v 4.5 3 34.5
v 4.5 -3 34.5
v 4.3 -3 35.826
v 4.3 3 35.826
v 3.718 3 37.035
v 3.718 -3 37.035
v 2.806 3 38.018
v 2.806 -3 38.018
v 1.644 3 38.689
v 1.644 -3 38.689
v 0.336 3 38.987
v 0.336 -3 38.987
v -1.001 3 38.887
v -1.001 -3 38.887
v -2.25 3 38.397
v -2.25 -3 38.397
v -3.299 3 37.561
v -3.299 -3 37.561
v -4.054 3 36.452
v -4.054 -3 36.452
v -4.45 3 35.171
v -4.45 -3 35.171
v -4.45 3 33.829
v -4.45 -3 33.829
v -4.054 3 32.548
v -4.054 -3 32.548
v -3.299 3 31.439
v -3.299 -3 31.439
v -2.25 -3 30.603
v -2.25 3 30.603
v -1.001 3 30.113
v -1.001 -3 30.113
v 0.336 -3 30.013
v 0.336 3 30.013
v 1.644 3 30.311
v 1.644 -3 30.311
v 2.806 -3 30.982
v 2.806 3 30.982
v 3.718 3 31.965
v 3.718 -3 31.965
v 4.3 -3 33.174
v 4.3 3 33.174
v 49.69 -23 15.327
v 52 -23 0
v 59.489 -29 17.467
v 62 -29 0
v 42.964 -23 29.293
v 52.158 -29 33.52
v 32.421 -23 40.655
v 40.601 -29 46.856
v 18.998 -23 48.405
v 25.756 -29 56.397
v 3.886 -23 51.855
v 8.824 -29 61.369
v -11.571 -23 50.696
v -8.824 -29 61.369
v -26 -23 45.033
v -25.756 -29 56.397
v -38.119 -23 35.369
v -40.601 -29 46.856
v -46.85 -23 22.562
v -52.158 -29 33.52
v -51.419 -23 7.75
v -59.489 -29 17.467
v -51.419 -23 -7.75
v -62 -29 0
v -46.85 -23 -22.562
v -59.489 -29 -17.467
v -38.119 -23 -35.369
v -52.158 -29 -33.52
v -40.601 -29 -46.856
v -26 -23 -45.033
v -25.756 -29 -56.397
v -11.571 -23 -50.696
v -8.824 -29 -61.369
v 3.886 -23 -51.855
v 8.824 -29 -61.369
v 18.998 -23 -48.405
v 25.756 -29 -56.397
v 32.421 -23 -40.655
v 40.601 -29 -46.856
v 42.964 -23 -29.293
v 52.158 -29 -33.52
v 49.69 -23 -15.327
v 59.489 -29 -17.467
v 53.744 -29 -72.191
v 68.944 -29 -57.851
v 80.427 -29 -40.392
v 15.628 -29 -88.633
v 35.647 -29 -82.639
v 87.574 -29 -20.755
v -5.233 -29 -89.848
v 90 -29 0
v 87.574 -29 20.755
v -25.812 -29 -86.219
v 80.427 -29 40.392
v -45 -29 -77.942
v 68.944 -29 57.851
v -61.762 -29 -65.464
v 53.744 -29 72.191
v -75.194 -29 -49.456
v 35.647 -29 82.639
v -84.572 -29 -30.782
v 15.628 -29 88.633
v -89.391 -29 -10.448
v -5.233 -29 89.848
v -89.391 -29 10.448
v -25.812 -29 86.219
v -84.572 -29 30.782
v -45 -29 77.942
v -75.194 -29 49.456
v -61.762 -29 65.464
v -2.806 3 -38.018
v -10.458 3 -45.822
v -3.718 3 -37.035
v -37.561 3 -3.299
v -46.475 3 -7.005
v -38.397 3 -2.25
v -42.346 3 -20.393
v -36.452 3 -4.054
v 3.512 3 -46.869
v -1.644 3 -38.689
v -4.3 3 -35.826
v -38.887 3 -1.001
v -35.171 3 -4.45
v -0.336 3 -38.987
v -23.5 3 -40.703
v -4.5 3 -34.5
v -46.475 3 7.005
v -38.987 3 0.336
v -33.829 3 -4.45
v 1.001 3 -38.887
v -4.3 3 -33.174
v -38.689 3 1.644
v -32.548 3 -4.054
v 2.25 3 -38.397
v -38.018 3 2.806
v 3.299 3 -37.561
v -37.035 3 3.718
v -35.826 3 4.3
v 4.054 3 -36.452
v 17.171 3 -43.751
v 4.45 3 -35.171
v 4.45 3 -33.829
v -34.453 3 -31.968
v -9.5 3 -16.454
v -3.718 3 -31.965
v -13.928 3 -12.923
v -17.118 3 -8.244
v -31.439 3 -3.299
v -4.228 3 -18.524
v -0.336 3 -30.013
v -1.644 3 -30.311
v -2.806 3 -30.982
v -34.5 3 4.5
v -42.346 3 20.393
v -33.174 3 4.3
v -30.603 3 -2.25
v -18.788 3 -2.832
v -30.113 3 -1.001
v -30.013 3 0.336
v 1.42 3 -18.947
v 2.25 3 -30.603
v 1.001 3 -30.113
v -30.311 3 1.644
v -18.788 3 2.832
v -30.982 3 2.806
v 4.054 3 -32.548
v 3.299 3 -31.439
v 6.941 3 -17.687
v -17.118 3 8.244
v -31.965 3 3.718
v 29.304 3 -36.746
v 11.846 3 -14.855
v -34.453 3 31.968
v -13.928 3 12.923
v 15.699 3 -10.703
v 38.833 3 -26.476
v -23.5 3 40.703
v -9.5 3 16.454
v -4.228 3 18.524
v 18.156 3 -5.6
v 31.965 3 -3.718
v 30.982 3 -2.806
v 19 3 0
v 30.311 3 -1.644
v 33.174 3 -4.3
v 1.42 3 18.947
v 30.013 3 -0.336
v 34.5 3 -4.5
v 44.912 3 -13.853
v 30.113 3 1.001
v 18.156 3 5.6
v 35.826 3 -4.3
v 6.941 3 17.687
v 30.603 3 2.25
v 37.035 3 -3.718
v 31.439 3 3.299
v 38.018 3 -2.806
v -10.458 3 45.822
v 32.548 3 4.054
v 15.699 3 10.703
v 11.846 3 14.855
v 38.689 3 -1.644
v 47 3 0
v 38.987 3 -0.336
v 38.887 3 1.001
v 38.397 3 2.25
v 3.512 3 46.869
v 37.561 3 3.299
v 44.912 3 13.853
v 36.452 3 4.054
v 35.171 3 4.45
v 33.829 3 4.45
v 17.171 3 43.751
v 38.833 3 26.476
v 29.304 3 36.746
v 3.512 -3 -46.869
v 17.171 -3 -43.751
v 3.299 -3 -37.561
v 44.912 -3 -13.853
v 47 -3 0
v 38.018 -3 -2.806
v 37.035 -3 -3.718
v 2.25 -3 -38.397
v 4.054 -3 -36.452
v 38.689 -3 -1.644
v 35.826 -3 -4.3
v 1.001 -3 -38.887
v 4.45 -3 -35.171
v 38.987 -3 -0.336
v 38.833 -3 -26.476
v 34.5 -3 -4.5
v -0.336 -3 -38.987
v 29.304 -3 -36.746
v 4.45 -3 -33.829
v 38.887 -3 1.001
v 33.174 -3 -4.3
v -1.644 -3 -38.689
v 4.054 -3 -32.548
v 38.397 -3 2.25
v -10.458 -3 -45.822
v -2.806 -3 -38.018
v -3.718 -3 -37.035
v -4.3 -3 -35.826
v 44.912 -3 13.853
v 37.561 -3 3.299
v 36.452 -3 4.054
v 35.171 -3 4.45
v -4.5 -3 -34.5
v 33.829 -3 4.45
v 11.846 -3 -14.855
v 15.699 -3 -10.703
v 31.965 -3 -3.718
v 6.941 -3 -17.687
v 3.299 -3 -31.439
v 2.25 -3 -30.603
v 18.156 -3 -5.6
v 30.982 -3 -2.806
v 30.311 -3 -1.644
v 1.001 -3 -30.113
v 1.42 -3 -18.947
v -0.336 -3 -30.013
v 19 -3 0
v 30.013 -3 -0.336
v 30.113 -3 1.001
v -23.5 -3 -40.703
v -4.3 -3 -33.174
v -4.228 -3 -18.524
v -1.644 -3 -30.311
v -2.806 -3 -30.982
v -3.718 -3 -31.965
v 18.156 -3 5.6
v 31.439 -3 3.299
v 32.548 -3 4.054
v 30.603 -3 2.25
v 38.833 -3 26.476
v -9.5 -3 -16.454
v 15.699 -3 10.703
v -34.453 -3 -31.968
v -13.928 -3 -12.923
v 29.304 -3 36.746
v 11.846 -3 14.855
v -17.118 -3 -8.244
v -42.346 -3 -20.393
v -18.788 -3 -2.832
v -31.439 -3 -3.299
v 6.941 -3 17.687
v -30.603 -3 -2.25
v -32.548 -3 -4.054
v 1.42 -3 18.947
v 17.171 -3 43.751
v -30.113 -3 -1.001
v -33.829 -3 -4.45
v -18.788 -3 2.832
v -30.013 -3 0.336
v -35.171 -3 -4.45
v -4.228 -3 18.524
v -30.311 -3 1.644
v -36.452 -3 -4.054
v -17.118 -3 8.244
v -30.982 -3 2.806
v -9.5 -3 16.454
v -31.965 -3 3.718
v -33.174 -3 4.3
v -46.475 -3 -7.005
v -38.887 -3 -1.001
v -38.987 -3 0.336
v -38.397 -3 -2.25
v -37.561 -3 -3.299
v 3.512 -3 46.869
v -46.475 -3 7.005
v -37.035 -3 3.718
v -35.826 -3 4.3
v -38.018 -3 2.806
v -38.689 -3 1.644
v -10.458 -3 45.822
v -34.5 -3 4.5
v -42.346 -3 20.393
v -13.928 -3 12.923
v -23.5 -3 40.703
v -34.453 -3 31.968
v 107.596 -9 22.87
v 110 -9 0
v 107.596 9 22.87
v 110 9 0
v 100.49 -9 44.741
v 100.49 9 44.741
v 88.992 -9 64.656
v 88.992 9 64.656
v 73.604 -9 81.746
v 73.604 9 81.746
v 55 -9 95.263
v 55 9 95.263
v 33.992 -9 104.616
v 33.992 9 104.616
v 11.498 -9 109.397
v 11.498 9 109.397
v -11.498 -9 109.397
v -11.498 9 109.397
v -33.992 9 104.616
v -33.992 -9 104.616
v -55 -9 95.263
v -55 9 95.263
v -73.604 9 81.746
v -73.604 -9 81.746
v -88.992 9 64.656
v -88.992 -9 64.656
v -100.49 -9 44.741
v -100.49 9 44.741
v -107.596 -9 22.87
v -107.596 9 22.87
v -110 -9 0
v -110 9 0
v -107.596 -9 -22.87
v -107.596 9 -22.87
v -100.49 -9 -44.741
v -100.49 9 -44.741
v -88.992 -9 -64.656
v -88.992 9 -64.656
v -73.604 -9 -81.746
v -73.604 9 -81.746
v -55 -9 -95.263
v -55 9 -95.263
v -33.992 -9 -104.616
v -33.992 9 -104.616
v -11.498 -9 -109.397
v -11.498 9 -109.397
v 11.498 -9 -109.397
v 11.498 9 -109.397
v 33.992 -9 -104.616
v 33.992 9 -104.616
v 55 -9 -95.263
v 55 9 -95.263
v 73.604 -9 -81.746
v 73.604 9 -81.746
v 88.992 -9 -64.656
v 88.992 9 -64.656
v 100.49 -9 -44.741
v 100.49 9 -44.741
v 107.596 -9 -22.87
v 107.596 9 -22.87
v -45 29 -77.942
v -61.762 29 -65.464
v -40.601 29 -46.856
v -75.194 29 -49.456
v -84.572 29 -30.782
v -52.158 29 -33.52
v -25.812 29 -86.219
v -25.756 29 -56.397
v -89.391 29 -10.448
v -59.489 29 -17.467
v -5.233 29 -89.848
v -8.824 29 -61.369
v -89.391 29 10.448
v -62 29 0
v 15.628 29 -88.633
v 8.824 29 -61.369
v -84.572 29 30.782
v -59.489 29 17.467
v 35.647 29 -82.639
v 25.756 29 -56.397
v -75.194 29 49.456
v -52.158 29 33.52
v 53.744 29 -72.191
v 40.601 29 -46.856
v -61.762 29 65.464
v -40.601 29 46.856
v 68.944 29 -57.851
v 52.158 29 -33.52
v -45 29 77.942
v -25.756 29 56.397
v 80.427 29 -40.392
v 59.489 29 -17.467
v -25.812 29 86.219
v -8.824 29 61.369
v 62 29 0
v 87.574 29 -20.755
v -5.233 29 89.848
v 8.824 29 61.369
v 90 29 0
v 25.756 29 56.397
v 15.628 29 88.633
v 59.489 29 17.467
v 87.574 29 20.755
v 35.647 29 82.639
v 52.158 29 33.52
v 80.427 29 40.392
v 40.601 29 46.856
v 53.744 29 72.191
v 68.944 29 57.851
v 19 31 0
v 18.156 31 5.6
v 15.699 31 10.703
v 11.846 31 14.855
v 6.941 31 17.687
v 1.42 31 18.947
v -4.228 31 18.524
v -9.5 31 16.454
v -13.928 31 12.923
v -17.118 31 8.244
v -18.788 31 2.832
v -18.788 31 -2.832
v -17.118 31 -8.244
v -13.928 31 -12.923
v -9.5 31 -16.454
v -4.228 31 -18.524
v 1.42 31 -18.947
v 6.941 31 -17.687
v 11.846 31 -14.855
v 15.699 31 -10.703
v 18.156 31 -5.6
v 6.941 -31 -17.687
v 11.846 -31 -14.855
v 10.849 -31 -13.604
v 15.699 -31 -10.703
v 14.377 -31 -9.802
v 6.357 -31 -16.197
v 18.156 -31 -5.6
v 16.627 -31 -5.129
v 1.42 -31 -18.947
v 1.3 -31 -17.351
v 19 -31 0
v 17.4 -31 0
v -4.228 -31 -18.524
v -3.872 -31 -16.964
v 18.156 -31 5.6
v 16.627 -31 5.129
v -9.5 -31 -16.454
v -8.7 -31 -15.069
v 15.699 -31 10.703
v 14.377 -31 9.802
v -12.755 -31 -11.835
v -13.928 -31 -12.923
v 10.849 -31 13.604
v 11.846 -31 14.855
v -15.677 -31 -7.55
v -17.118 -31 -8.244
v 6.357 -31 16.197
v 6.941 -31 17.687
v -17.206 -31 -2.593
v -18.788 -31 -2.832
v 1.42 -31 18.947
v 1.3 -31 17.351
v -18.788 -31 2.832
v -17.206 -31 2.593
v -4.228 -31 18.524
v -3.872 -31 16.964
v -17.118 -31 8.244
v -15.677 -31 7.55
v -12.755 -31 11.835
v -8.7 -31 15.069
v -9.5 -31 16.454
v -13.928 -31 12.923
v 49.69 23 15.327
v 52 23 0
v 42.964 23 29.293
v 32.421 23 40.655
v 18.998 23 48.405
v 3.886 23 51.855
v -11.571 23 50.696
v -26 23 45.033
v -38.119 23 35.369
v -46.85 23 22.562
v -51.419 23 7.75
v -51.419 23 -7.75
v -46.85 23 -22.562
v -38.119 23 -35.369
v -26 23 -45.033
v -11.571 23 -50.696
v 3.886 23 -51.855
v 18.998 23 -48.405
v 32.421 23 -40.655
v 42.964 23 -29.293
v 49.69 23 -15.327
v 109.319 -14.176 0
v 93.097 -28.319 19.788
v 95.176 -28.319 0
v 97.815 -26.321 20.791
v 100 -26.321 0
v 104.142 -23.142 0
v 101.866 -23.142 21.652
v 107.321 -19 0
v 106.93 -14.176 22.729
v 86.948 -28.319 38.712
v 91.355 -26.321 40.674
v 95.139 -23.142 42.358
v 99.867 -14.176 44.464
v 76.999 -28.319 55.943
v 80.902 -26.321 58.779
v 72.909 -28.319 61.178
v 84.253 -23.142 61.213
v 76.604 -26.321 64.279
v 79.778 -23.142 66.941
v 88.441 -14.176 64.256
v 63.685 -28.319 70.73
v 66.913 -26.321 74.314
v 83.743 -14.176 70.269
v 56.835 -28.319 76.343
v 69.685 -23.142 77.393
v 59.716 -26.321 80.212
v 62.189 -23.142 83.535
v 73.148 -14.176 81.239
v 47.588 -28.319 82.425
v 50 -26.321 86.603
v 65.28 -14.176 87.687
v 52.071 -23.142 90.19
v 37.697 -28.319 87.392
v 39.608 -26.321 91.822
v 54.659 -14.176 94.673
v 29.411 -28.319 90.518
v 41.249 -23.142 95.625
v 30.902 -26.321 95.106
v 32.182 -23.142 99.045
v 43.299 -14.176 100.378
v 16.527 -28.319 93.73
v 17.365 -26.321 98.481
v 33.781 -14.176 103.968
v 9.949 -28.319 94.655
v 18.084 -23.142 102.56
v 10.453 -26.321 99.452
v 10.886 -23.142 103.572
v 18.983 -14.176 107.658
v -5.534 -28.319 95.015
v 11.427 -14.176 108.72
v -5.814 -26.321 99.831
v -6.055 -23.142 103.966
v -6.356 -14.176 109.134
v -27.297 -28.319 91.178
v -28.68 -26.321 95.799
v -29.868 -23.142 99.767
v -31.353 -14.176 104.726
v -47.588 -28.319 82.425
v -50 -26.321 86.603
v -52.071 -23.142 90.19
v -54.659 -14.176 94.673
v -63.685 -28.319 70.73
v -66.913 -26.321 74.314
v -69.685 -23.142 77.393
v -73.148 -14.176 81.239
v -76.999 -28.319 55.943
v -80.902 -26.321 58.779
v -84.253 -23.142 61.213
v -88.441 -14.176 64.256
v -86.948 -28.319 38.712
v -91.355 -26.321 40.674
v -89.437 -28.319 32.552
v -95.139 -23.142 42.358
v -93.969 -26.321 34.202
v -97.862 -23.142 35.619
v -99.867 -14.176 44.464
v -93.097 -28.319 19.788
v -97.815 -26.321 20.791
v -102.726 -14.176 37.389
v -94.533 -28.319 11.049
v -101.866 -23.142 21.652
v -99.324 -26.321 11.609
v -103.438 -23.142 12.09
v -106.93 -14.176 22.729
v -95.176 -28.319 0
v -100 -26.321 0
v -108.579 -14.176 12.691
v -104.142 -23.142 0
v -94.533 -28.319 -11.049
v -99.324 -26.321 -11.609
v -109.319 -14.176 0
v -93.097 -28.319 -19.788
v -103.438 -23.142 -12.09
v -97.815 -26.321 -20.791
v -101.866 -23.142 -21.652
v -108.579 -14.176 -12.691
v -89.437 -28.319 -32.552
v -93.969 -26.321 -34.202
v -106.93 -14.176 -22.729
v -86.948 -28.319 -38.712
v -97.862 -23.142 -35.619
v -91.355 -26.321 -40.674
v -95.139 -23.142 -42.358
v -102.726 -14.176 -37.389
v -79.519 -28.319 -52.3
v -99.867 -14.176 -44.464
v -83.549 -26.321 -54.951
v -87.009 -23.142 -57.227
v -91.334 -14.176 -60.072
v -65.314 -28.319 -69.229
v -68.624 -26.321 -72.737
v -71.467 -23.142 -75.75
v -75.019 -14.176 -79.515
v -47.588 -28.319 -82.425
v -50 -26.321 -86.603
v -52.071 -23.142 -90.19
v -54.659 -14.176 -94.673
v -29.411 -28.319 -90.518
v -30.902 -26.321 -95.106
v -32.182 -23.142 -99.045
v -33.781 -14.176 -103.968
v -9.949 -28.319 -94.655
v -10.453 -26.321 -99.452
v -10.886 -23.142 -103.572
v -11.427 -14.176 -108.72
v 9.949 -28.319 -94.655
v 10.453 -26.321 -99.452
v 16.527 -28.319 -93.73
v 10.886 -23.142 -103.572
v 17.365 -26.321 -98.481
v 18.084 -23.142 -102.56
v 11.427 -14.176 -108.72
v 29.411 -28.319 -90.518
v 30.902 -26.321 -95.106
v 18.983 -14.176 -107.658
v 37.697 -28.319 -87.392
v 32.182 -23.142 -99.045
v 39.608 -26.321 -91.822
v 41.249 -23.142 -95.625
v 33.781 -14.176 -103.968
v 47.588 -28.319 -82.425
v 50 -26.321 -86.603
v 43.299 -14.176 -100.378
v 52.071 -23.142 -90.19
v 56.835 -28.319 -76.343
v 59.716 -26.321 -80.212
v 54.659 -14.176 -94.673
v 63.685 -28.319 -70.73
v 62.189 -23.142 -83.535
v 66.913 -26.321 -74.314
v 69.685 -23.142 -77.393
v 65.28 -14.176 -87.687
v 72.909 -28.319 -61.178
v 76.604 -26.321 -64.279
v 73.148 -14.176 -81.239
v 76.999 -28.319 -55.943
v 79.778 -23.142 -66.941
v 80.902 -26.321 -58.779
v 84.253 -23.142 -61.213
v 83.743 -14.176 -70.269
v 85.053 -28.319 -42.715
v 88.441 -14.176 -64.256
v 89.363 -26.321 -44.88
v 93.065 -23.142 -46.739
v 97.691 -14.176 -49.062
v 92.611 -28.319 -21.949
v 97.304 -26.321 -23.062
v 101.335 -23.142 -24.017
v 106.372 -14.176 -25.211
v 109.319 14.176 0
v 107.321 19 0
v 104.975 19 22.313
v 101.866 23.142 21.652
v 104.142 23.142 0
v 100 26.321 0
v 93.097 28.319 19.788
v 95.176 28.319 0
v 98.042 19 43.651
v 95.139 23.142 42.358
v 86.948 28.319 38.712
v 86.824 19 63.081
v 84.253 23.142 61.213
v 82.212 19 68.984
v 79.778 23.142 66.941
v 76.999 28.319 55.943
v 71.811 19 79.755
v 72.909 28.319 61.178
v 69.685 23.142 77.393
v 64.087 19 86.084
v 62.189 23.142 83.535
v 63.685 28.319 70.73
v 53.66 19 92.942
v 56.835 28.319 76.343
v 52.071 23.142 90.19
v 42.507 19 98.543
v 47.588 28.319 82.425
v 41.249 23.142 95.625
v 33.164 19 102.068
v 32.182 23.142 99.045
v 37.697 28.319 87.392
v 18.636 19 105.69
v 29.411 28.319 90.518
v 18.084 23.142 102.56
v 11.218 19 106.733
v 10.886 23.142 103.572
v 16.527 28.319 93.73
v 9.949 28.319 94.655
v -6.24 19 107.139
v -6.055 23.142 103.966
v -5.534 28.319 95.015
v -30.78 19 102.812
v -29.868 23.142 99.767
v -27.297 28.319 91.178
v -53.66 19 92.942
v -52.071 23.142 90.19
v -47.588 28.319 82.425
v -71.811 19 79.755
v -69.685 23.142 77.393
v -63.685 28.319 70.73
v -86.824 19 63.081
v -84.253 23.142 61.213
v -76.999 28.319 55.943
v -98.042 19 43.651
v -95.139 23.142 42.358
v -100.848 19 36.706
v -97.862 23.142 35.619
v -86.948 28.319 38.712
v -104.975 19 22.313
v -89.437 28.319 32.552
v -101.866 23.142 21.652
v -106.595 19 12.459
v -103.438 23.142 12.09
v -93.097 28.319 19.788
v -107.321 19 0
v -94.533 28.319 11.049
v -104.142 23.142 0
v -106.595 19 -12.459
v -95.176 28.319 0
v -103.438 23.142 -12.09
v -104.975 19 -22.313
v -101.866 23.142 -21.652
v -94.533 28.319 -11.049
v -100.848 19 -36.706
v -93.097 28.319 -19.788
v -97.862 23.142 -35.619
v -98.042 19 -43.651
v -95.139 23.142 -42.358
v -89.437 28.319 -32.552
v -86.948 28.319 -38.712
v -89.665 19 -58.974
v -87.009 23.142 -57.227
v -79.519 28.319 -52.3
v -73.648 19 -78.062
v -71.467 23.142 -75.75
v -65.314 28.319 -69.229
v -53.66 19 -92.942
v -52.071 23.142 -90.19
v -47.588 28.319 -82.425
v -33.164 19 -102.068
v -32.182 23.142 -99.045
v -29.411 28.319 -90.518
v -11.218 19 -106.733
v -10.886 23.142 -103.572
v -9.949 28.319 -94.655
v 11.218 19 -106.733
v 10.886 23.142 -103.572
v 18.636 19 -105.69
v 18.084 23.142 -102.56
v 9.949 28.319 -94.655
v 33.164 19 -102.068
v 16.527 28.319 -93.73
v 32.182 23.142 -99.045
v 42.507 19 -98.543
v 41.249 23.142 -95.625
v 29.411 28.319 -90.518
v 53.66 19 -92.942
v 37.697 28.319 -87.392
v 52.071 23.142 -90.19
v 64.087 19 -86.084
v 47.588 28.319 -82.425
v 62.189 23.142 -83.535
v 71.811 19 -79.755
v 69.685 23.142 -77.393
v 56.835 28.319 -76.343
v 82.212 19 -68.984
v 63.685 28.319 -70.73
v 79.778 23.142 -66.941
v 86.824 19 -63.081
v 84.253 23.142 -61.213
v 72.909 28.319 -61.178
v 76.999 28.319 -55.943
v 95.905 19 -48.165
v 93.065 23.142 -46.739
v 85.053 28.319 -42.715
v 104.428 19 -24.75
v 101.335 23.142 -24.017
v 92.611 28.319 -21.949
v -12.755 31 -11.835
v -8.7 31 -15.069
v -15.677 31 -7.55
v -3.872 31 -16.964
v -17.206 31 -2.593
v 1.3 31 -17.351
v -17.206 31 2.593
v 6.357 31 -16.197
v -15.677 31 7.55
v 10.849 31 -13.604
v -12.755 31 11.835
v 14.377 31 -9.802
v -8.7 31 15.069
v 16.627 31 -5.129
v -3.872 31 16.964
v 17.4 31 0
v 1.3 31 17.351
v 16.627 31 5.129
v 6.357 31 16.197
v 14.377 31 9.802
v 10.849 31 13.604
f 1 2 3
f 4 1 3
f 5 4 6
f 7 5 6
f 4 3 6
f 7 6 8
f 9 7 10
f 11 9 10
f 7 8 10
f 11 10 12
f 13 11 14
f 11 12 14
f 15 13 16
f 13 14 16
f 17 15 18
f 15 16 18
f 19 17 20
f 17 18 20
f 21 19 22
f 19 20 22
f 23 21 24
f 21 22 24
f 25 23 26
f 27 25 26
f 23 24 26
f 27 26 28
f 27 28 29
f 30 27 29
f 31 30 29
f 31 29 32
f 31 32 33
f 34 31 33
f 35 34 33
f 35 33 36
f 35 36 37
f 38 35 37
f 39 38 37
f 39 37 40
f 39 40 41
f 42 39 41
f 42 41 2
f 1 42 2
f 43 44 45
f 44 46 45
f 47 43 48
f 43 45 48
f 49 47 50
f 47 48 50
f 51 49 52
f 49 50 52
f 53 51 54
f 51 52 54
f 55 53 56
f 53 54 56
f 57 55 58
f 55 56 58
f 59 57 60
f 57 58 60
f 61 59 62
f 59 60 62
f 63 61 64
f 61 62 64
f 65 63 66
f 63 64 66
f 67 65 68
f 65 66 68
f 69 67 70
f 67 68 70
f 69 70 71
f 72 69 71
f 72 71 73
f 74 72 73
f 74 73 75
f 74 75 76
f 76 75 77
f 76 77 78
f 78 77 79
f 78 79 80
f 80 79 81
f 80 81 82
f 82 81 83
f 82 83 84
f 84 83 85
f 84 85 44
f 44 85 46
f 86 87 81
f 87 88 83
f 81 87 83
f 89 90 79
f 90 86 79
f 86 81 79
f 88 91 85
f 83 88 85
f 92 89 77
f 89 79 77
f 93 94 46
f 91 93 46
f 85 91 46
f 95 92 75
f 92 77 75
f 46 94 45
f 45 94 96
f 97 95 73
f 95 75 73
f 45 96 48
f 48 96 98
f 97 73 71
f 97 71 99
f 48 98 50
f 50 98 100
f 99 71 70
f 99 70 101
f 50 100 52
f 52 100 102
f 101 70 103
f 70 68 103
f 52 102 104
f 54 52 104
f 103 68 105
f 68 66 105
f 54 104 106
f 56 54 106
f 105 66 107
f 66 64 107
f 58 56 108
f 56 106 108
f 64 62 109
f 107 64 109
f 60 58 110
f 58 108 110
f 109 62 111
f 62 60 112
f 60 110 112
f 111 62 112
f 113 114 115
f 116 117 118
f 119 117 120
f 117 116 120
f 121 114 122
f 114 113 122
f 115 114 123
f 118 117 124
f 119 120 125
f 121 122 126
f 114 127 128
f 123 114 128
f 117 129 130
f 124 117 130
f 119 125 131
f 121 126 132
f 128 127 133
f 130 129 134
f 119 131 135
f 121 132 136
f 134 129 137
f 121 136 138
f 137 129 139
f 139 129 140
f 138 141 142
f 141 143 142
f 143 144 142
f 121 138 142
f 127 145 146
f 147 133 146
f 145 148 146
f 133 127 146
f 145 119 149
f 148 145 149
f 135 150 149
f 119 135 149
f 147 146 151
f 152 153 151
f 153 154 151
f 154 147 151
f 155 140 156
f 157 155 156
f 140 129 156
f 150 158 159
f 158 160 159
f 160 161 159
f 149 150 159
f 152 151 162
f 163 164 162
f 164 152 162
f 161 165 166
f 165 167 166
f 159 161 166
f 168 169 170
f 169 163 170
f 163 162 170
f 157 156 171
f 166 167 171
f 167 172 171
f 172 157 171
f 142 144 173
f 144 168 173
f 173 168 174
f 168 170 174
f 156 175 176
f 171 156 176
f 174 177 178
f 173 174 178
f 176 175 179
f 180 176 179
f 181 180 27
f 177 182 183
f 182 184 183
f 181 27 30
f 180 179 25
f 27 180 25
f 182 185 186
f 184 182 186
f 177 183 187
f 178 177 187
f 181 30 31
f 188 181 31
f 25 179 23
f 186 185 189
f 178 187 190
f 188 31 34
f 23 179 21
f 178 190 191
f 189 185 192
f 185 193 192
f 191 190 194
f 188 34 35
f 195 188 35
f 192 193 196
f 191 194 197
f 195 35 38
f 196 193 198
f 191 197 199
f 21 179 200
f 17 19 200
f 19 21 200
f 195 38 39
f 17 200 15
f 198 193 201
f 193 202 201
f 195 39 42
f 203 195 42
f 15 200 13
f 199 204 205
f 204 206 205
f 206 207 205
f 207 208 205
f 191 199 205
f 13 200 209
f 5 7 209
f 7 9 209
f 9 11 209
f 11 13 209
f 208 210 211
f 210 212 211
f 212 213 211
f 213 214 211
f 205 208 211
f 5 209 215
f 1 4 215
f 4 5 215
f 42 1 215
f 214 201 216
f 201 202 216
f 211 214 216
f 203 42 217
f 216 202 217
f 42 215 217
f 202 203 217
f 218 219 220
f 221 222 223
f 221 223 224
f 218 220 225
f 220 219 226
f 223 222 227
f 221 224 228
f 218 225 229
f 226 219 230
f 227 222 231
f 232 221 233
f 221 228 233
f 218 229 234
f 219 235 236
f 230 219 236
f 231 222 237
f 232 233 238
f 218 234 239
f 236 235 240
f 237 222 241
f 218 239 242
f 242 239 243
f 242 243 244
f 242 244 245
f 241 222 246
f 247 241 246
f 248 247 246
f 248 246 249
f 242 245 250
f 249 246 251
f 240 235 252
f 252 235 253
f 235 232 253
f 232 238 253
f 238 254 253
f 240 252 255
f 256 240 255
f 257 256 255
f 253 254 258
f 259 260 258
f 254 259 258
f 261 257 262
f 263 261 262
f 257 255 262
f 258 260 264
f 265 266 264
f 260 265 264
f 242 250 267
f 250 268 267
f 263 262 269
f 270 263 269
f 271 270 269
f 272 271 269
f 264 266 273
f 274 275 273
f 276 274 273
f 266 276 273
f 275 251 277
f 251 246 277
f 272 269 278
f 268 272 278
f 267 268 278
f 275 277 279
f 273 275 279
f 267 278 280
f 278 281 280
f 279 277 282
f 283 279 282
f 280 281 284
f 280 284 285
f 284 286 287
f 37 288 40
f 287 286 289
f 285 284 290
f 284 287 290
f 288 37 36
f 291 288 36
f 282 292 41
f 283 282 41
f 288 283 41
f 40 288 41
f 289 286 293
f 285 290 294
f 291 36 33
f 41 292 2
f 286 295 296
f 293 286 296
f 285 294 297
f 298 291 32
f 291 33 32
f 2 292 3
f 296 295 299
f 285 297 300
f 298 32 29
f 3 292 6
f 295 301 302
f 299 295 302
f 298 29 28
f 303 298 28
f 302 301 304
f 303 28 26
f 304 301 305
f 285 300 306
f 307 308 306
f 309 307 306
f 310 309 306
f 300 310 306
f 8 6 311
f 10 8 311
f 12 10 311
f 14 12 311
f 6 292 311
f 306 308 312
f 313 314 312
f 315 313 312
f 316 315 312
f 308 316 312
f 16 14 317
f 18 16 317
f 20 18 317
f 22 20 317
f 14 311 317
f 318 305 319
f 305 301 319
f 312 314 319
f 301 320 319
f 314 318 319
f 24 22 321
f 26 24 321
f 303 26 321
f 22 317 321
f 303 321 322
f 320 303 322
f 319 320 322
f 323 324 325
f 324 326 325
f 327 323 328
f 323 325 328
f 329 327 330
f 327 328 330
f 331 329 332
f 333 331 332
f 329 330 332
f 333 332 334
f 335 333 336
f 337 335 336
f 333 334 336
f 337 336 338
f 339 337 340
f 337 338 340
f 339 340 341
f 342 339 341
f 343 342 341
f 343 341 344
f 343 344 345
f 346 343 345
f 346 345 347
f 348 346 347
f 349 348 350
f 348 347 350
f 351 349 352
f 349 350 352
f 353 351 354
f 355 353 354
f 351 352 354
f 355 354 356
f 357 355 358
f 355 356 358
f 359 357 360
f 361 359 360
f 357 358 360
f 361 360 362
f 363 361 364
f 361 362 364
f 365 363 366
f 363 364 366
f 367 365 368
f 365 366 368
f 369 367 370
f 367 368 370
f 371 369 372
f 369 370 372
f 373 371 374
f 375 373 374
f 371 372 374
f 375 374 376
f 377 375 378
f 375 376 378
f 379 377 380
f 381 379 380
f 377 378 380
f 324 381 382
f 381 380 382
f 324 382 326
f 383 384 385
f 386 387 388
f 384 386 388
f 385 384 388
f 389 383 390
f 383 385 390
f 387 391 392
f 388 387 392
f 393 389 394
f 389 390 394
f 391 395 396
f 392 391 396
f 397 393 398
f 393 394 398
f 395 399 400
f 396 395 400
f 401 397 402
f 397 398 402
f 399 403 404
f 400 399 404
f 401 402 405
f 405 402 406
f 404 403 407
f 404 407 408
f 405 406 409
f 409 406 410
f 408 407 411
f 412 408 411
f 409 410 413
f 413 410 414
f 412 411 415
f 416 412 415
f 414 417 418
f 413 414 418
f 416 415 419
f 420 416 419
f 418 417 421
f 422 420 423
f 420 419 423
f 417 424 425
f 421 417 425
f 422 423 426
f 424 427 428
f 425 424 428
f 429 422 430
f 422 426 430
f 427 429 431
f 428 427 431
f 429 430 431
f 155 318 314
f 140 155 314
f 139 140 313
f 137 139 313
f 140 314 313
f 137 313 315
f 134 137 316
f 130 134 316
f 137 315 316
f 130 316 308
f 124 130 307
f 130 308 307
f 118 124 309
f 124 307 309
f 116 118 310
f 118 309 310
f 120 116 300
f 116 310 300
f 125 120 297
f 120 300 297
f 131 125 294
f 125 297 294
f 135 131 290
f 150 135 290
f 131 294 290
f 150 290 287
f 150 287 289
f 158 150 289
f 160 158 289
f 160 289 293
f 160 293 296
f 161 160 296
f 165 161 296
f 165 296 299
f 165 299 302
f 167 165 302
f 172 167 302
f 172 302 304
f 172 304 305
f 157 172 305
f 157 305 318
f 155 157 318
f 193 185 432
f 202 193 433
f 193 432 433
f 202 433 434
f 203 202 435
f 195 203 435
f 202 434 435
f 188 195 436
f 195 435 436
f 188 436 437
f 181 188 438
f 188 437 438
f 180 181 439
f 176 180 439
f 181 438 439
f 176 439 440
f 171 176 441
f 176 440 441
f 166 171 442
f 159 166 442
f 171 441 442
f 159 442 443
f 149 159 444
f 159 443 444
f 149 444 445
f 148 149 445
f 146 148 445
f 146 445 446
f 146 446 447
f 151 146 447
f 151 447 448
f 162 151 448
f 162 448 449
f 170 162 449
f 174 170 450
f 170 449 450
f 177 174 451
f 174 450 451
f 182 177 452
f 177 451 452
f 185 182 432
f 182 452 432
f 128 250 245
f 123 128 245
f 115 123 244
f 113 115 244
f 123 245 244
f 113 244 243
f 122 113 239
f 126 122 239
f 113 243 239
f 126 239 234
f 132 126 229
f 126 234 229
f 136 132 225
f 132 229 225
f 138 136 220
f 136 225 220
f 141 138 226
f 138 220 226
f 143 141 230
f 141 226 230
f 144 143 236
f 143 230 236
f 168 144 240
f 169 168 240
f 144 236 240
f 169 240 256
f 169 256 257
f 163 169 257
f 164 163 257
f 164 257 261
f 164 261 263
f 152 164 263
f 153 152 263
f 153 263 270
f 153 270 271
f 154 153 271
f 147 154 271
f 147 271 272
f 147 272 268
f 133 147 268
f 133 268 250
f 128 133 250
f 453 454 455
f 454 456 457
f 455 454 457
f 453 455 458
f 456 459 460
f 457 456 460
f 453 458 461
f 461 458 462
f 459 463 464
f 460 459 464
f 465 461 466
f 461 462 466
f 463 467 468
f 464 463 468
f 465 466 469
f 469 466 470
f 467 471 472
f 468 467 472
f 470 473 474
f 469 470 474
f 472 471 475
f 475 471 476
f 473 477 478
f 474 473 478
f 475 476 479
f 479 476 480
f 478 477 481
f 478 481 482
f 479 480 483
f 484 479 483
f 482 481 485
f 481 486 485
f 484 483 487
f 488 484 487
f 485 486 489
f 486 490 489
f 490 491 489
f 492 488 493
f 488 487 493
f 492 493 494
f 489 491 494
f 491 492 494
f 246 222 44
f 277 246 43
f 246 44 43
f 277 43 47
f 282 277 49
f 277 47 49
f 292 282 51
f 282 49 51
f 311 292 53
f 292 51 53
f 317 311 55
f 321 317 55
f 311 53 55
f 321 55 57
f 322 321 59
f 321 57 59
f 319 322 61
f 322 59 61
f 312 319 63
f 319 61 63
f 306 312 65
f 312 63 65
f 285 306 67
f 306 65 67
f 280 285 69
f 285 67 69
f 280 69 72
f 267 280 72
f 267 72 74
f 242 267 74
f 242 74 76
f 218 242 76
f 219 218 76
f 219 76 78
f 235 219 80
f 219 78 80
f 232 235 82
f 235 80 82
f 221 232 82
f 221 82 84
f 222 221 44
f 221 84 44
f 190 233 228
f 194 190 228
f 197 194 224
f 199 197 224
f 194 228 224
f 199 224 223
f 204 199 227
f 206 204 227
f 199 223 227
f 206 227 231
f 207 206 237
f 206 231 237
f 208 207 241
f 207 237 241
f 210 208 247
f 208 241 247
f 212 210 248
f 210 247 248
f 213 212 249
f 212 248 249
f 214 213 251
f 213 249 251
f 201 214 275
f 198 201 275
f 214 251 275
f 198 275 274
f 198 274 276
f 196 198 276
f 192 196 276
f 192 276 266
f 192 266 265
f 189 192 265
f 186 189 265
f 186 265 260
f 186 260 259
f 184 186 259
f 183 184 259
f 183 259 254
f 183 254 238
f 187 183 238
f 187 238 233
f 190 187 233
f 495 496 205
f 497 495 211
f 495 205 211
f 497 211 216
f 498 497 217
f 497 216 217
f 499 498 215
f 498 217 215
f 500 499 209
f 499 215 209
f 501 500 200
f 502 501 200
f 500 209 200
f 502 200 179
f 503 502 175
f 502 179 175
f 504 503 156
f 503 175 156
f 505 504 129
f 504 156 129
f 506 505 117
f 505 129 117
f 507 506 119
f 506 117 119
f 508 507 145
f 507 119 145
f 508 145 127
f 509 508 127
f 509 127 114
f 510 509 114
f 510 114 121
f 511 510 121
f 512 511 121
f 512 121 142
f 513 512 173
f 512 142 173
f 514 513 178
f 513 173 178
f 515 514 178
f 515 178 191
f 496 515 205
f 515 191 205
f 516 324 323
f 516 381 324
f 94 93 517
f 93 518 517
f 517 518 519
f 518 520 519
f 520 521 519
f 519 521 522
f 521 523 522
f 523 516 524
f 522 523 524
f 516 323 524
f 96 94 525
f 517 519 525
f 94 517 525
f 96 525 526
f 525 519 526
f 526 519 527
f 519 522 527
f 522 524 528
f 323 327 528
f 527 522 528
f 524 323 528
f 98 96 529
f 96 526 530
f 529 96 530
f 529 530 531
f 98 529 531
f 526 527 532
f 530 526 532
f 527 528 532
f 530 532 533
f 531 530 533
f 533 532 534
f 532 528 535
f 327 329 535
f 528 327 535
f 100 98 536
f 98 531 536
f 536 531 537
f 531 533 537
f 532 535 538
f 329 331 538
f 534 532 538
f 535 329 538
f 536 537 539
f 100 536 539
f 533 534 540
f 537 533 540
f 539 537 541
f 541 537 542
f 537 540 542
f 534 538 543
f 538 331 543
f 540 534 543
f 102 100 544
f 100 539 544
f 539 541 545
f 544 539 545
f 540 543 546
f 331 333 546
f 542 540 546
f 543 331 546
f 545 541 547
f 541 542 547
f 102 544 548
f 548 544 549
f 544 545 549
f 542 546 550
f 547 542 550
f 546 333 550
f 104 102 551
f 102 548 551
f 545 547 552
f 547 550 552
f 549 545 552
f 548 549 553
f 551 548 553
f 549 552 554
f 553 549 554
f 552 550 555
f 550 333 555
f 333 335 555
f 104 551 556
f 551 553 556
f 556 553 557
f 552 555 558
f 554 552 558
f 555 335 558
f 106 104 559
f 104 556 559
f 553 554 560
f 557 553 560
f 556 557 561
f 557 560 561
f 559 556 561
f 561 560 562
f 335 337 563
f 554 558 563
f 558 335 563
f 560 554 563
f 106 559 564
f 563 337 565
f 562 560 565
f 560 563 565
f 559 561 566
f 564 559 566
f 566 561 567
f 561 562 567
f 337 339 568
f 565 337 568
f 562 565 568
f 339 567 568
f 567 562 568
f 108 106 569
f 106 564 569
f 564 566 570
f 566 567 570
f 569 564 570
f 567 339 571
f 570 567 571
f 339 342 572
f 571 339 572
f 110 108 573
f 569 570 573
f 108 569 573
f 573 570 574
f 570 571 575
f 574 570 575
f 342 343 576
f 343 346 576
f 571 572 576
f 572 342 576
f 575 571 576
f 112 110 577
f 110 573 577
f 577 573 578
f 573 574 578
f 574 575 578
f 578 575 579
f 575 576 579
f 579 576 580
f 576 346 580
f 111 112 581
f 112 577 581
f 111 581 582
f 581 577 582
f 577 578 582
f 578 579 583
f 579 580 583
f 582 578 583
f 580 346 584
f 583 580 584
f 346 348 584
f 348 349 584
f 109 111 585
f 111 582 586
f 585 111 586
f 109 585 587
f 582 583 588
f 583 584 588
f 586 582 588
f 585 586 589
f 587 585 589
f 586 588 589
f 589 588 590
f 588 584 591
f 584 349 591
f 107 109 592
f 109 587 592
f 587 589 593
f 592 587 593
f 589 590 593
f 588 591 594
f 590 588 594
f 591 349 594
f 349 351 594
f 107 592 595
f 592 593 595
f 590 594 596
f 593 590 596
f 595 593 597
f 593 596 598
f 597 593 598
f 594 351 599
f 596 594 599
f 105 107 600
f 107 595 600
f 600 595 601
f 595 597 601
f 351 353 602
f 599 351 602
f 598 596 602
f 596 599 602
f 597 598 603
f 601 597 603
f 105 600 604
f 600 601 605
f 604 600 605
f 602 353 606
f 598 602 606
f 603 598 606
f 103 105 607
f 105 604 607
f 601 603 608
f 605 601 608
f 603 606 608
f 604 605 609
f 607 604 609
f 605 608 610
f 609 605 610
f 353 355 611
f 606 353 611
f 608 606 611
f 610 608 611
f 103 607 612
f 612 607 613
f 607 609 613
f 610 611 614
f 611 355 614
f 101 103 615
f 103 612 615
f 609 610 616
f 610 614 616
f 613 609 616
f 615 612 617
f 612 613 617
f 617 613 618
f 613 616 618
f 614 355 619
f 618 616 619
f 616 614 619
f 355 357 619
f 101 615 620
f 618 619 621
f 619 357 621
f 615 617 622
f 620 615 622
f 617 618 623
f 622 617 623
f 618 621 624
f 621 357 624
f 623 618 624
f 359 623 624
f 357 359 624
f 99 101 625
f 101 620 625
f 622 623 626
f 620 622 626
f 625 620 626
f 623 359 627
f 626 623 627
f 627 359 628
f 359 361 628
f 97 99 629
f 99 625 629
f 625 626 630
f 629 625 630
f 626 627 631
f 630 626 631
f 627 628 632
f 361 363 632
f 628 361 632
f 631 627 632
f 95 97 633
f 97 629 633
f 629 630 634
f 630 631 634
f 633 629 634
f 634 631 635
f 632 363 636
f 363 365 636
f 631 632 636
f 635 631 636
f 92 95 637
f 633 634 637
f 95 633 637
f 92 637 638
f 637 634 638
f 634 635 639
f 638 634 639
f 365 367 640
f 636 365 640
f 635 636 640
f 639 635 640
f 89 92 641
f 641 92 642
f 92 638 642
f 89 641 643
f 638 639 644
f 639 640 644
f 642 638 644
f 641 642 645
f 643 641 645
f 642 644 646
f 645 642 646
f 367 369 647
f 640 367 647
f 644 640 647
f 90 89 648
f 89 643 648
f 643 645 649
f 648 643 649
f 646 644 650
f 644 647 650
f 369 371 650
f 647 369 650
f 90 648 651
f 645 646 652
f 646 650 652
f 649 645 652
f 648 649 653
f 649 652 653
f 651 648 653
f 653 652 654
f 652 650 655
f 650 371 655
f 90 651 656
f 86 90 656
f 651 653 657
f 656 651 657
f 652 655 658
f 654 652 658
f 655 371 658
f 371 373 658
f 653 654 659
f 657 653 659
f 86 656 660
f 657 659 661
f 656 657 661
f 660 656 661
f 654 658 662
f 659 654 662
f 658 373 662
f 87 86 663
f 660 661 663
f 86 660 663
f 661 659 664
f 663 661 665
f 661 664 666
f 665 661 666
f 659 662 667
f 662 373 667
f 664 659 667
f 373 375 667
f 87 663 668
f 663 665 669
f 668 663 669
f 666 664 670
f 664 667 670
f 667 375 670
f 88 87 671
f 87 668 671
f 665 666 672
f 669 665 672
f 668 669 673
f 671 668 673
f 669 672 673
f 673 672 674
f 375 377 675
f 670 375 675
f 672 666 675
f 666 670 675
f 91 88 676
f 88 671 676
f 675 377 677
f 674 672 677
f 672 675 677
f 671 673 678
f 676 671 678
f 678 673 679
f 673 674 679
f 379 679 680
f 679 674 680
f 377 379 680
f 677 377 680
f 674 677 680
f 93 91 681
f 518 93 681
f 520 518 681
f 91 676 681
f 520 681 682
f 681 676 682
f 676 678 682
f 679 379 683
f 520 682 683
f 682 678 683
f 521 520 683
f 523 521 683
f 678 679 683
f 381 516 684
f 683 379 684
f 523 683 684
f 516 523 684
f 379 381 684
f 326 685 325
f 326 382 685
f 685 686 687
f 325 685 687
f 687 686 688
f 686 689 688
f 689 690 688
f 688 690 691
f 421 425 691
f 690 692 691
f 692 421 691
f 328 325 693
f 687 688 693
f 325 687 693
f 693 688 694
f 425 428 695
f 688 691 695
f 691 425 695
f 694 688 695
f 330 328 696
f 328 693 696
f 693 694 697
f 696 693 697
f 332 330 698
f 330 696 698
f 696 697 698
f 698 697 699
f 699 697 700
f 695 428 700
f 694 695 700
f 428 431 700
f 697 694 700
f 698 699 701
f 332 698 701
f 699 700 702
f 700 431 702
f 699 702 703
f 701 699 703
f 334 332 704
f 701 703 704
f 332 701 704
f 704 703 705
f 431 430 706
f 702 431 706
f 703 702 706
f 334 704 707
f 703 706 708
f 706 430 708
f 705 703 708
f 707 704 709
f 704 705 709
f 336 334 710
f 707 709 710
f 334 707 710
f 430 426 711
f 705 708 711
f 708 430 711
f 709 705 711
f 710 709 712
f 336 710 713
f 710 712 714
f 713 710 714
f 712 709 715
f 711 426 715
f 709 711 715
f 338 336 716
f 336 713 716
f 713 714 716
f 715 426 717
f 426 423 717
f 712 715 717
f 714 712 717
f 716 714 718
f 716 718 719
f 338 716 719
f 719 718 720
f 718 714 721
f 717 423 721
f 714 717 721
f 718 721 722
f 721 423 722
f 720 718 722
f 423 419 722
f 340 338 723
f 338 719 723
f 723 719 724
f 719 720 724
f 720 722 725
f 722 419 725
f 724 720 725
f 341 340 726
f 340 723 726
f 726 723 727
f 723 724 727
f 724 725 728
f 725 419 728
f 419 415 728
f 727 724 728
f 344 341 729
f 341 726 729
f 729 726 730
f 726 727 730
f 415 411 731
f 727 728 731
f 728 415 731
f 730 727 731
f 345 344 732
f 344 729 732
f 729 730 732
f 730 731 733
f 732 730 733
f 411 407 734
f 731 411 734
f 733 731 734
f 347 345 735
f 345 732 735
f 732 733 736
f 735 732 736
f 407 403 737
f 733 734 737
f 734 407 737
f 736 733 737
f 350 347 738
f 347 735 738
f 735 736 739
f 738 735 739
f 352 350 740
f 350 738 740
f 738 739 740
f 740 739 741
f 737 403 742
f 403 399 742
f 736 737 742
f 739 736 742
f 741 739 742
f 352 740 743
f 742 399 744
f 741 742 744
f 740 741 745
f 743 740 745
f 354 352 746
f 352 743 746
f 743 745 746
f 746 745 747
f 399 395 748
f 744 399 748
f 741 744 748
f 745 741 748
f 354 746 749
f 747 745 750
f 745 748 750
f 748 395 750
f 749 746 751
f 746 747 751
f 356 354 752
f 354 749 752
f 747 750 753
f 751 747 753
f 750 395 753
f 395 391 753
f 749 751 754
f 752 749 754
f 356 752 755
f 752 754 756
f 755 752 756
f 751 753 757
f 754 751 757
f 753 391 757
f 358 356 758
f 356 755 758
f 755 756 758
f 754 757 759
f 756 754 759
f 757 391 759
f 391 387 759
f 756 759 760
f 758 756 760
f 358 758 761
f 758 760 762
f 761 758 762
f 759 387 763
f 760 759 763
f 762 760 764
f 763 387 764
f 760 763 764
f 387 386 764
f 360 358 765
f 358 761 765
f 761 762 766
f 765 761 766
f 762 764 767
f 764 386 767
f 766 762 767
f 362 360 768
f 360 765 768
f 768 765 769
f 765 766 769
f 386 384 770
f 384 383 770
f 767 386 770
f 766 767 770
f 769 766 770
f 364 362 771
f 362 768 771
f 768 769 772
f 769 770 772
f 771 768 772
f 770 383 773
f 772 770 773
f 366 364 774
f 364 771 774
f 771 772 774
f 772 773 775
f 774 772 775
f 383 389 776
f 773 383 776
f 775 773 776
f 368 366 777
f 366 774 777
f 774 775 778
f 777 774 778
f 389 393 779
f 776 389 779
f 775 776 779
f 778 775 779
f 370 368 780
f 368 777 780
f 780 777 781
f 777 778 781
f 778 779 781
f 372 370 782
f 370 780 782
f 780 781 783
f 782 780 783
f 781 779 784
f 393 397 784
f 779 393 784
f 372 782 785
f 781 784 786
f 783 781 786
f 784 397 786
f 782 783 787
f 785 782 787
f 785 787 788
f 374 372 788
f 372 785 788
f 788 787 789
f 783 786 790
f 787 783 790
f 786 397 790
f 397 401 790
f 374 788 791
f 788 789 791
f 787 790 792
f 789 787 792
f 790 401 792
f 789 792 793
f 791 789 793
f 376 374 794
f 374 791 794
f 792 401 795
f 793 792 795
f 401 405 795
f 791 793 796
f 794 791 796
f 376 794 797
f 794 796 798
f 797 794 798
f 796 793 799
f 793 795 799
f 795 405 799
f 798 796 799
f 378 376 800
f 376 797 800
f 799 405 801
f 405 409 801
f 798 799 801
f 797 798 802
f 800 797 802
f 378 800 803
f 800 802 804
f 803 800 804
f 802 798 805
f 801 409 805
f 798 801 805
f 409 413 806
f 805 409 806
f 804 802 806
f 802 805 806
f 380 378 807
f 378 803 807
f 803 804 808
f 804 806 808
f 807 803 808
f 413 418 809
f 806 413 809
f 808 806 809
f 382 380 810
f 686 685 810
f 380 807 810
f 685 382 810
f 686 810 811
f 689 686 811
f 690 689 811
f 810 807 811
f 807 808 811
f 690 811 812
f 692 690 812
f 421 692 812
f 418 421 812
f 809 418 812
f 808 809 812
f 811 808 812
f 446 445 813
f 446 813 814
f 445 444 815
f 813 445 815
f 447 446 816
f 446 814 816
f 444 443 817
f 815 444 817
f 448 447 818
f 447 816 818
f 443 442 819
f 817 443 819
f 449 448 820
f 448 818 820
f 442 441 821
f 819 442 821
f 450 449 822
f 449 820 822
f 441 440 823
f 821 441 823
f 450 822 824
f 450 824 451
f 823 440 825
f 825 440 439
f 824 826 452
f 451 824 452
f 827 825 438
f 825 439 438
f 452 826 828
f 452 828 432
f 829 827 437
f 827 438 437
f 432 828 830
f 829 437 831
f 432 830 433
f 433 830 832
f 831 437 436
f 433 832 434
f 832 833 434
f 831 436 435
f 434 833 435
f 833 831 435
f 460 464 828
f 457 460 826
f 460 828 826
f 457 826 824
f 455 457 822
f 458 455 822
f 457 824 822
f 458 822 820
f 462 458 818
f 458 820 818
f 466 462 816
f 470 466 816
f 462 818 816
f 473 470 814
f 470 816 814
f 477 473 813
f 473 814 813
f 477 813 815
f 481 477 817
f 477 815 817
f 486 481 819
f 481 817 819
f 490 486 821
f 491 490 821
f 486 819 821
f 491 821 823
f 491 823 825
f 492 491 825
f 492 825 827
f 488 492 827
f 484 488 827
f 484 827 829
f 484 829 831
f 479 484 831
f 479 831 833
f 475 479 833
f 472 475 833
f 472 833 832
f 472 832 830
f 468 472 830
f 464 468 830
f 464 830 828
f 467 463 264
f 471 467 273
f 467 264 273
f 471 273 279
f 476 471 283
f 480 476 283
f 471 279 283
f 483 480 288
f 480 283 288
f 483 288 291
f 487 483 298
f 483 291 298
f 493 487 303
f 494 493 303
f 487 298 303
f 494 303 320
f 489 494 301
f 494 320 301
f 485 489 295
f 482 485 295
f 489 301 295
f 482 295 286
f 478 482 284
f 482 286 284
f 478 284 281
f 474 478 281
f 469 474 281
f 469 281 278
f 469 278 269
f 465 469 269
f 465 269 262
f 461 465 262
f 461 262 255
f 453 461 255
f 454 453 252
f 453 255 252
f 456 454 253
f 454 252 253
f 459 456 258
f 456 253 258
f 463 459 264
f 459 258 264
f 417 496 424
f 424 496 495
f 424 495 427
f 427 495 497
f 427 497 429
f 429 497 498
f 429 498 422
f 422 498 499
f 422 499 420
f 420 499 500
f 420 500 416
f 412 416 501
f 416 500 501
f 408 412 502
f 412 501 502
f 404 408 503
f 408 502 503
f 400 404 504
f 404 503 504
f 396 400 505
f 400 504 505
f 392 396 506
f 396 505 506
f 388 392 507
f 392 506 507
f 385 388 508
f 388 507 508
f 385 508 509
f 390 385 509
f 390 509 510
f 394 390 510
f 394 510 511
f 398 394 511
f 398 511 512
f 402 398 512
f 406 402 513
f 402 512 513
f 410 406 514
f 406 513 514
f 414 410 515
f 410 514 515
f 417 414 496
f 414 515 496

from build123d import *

# Parameters (mm, degrees)
TALADRO_DE_MARGEN_PARA_M101_D = 11
TALADRO_DE_MARGEN_PARA_M81_D  = 9
MATRIZC1_COUNT                = 4
CROQUIS8_R                    = 17.4
CORTAR_EXTRUIR2_DEPTH         = 70


with BuildPart() as part:
    # Croquis2 → Revolución1 (revolve)
    with BuildSketch(Plane.XY):
        with BuildLine():
            Line((19, 31), (0, 31))
            Line((0, 31), (0, 0))
            Line((0, 0), (110, 0))
            Line((110, 0), (110, 9))
            ThreePointArc((110, 9), (104.142135624, 23.142135624), (90, 29))
            Line((90, 29), (62, 29))
            Line((62, 29), (52, 23))
            Line((52, 23), (47, 3))
            Line((47, 3), (19, 3))
            Line((19, 3), (19, 31))
        make_face()
        with BuildLine():
            Line((110, 0), (0, 0))
            Line((0, 0), (0, -31))
            Line((0, -31), (19, -31))
            Line((19, -31), (19, -3))
            Line((19, -3), (47, -3))
            Line((47, -3), (52, -23))
            Line((52, -23), (62, -29))
            Line((62, -29), (90, -29))
            ThreePointArc((90, -29), (104.142135624, -23.142135624), (110, -9))
            Line((110, -9), (110, 0))
        make_face()
    revolve(axis=Axis((0, 64.768346902, 0), (0, -1, 0)))

    # Taladro de margen para M101 (through all)
    with Locations(Plane(origin=(0, 31, 0), x_dir=(1, 0, 0), z_dir=(0, 1, 0))):
        with Locations((0, 0)):
            Hole(TALADRO_DE_MARGEN_PARA_M101_D / 2)

    # Taladro de margen para M81 (through all)
    with Locations(Plane(origin=(0, 3, 0), x_dir=(1, 0, 0), z_dir=(0, 1, 0))):
        with Locations((0, 34.5)):
            taladro_de_margen_para_m81 = Hole(TALADRO_DE_MARGEN_PARA_M81_D / 2)

    # MatrizC1: Taladro de margen para M81 ×4 about axis
    matrizc1_axis = Axis((0, 0, 0), (0, 1, 0))
    for i in range(1, MATRIZC1_COUNT):
        add(taladro_de_margen_para_m81.rotate(matrizc1_axis, i * 360 / MATRIZC1_COUNT), mode=Mode.SUBTRACT)

    # Croquis8 → Cortar-Extruir2 (cut)
    with BuildSketch(Plane(origin=(0, 31, 0), x_dir=(1, 0, 0), z_dir=(0, 1, 0))):
        Circle(CROQUIS8_R)
    extrude(amount=-CORTAR_EXTRUIR2_DEPTH, mode=Mode.SUBTRACT)


solid = part.part
